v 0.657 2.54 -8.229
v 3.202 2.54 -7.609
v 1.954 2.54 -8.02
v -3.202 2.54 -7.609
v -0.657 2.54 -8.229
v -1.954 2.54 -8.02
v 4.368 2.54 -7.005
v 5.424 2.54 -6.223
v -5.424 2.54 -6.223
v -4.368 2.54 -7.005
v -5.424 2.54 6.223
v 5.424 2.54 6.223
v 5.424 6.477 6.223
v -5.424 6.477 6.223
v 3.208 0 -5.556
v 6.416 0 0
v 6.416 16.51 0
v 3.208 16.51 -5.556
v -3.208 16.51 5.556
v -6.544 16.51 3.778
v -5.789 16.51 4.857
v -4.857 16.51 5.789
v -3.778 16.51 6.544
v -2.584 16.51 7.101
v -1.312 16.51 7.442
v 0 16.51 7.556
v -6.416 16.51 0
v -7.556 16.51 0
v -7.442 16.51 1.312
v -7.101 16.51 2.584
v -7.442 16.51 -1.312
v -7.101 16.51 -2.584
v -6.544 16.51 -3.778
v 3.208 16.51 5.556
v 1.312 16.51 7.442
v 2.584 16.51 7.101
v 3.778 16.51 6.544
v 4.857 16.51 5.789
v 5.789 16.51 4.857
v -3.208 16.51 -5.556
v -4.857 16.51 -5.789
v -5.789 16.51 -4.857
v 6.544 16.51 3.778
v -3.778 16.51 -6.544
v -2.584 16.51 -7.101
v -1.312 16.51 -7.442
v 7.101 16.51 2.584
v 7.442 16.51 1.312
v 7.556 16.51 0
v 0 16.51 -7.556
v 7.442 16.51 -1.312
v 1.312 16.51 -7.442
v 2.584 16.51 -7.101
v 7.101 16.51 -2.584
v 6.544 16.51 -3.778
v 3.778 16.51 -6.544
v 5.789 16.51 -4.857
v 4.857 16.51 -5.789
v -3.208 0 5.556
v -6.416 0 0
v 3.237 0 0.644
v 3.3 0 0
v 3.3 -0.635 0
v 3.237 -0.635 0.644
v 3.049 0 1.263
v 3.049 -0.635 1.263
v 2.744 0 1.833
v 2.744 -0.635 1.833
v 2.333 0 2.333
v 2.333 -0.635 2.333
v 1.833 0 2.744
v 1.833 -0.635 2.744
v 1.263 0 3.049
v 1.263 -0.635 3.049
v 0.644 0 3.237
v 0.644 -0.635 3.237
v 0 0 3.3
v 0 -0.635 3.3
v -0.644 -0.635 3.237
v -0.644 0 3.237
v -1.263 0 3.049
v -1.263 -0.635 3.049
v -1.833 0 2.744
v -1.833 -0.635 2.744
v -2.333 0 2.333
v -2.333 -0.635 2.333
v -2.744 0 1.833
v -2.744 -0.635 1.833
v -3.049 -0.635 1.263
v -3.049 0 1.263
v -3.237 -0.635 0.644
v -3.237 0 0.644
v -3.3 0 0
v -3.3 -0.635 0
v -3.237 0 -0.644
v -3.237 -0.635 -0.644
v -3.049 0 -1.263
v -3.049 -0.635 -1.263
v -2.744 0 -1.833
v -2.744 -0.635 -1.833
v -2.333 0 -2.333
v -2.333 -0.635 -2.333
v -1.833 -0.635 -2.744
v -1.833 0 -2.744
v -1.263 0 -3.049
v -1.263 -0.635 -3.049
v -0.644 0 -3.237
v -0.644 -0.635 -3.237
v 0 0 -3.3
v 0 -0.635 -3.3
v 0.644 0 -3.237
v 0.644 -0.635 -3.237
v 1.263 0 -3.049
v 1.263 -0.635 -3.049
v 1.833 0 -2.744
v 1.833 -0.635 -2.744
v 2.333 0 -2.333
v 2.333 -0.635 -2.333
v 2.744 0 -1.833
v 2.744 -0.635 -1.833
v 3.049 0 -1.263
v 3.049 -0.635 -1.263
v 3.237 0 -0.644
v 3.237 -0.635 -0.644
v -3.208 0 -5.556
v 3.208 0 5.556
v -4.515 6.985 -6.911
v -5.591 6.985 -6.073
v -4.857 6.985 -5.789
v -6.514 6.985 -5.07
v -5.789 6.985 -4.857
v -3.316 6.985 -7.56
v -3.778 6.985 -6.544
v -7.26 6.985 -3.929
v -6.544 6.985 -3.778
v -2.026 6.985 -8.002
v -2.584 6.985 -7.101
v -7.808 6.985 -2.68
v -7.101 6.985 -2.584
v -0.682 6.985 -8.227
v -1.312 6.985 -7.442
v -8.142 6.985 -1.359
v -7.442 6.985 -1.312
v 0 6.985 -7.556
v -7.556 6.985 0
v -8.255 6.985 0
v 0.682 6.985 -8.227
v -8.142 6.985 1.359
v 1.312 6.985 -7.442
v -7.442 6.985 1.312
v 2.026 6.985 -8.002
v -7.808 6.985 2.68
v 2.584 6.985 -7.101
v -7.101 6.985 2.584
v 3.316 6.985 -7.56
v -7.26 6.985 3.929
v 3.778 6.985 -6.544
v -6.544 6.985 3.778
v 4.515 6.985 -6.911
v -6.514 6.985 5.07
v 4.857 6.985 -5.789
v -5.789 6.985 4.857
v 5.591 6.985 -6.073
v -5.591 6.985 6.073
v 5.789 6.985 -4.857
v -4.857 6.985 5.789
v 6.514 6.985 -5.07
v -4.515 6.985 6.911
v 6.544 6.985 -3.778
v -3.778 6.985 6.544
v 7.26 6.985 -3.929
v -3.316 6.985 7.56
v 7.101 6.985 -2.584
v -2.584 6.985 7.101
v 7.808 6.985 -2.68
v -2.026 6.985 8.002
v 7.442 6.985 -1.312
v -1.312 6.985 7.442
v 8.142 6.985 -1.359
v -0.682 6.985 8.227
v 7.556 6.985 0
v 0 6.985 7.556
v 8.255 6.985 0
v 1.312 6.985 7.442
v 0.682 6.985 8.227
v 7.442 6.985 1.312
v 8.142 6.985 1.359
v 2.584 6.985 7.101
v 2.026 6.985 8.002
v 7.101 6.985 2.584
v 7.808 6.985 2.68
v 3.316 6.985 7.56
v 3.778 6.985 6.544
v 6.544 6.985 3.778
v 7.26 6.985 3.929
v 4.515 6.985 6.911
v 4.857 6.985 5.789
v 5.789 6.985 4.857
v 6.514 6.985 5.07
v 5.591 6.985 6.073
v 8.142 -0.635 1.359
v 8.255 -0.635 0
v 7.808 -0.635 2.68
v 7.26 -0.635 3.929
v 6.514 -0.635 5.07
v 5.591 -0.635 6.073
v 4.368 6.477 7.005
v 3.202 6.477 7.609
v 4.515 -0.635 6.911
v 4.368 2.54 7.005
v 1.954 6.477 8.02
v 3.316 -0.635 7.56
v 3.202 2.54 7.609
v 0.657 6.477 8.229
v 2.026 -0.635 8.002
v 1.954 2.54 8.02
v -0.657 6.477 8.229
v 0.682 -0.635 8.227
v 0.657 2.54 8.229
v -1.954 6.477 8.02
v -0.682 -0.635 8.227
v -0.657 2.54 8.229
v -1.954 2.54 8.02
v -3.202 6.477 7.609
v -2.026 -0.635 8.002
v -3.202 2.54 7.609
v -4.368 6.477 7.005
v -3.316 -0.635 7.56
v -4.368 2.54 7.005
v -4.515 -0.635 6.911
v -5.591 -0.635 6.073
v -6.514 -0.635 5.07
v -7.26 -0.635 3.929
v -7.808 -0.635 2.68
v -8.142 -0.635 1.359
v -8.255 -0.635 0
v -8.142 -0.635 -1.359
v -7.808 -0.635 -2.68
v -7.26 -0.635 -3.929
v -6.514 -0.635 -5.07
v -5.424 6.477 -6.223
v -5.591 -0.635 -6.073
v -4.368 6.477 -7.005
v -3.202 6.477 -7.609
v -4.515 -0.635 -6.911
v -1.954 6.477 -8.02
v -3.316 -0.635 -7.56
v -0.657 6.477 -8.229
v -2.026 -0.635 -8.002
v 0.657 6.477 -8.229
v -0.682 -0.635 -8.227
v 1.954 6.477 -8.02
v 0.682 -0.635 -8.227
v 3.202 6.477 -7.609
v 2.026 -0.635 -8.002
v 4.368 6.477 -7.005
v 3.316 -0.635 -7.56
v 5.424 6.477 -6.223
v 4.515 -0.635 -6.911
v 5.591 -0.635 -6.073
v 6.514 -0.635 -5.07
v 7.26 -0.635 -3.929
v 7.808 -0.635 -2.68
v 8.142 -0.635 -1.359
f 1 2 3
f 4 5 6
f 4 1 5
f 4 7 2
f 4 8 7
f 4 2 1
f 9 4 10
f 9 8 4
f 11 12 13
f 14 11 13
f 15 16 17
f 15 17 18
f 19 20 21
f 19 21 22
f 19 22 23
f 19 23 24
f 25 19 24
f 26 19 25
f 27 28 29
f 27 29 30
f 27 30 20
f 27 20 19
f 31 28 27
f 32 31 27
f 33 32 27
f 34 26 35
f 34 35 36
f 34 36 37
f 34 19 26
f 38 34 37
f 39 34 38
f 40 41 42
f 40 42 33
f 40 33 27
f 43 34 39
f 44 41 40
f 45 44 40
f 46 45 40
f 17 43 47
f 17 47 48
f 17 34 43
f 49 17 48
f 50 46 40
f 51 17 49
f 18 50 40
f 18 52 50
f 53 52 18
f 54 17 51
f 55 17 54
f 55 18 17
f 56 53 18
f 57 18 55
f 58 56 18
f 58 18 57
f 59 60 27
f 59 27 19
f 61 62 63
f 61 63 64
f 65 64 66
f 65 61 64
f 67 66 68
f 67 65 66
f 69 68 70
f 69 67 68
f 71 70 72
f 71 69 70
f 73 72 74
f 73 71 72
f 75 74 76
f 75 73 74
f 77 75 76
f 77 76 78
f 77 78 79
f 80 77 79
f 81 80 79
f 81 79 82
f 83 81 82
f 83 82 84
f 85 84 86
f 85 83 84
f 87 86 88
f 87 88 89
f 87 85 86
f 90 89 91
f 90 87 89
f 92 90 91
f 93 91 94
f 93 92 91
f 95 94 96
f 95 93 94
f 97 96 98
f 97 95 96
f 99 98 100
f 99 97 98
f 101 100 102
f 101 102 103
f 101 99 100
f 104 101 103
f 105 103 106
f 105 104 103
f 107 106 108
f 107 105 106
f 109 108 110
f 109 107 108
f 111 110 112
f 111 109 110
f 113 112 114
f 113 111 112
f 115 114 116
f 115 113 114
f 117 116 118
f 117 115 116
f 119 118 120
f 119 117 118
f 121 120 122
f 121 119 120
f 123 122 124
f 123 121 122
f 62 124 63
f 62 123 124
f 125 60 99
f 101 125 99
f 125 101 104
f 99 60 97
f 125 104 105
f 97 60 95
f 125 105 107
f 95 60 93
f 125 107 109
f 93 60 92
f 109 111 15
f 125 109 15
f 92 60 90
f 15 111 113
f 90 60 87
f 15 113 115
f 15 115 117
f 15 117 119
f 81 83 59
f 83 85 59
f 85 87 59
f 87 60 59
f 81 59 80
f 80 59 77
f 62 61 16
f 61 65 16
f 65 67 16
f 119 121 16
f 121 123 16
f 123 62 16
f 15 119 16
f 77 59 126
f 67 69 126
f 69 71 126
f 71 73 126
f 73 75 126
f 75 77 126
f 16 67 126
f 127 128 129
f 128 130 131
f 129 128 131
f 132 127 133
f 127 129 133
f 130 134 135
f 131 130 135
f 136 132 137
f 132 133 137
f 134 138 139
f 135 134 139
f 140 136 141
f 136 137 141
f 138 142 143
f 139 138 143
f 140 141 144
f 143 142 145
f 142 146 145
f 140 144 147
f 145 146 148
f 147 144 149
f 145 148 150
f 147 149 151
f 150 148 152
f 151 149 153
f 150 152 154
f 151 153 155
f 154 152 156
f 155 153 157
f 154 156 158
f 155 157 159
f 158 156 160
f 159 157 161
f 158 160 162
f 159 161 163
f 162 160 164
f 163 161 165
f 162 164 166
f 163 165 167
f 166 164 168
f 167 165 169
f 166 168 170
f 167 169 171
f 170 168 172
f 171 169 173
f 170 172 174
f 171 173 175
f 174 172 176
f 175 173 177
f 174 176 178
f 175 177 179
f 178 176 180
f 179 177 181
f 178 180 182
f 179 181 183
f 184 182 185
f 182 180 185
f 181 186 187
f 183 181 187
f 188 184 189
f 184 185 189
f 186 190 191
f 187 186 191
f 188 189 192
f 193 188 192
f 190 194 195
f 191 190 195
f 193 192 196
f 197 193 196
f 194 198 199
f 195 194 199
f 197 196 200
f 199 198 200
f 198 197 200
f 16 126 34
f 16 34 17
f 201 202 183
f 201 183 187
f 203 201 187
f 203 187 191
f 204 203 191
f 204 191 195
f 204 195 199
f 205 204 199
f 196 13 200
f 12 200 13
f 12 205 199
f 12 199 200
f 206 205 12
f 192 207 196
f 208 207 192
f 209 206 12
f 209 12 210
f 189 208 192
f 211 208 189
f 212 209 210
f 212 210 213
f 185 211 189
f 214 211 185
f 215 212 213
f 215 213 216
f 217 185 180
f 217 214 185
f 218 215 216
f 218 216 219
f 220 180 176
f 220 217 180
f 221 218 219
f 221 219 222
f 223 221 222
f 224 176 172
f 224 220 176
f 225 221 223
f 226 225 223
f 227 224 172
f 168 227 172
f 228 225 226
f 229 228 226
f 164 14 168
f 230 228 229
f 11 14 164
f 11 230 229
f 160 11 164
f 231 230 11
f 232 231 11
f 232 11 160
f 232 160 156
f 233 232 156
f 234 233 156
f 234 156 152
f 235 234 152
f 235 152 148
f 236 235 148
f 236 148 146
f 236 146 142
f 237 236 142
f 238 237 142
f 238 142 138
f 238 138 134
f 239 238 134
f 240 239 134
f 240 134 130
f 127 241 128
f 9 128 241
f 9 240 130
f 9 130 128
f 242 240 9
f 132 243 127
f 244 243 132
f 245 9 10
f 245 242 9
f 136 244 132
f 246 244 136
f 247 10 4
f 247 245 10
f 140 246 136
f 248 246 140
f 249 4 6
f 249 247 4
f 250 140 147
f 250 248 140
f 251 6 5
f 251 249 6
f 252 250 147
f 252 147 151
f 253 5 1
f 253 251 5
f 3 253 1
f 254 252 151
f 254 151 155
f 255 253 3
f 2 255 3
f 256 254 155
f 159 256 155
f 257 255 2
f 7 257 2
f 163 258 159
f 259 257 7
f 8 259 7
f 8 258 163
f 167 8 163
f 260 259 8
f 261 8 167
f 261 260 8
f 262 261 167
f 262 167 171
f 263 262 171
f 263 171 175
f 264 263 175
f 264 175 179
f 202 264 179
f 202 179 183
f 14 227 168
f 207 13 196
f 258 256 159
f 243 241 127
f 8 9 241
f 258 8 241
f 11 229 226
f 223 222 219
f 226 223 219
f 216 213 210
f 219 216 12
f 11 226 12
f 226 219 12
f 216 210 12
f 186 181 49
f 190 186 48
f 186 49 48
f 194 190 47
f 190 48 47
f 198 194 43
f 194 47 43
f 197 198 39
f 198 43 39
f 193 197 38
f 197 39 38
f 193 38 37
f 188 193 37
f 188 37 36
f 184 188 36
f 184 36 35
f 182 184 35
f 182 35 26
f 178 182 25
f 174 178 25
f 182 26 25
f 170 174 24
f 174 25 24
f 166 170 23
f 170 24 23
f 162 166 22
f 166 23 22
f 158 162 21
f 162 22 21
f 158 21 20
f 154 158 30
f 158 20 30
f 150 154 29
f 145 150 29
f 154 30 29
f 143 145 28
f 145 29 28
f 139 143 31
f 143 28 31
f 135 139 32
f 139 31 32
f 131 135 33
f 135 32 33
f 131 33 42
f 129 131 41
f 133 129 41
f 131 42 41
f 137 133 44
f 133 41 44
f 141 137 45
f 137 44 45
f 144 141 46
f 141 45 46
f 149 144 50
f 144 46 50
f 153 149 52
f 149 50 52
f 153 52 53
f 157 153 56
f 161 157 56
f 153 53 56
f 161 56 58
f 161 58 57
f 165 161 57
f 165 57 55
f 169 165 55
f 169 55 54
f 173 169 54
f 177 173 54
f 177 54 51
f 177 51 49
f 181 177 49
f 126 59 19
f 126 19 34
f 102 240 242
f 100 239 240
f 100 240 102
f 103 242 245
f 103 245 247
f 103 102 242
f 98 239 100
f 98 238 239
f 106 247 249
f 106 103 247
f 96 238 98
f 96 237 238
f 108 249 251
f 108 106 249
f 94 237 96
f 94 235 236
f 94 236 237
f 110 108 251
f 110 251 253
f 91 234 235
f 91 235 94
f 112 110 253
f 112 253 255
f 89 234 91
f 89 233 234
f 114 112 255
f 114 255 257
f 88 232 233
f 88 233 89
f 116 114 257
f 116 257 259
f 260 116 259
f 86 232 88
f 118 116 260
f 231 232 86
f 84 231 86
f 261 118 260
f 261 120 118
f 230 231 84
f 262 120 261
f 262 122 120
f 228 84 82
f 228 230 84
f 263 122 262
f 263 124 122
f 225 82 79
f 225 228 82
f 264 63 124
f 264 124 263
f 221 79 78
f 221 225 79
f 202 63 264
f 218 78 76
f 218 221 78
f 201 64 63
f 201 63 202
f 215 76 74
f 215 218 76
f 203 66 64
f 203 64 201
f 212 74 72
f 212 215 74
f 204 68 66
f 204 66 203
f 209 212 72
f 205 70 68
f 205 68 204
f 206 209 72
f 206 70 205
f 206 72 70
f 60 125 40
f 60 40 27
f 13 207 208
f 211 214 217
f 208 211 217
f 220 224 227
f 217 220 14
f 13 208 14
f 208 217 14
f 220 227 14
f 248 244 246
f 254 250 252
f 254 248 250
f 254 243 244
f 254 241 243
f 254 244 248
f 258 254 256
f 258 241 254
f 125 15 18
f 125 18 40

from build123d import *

# Parameters (mm, degrees)
SKETCH1_R               = 7.5565
BOSS_EXTRUDE1_DEPTH     = 16.51
SKETCH2_R               = 7.5565
SKETCH2_R_2             = 3.3
BOSS_EXTRUDE2_DEPTH     = 0.635
SKETCH4_R               = 8.255
SKETCH4_R_2             = 7.5565
BOSS_EXTRUDE3_DEPTH     = 7.62
SKETCH3_W               = 2.572814656
SKETCH3_H               = 3.937
SKETCH3_W_2             = 2.256055482
CUT_EXTRUDE1_DEPTH      = 9.255
CUT_EXTRUDE1_DEPTH_BACK = 9.255


with BuildPart() as part:
    # Sketch1 → Boss-Extrude1 (new body)
    with BuildSketch(Plane(origin=(0, 0, 0), x_dir=(1, 0, 0), z_dir=(0, 1, 0))):
        Circle(SKETCH1_R)
        Polygon((-3.207902433, 5.55625), (-6.415804866, 0), (-3.207902433, -5.55625), (3.207902433, -5.55625), (6.415804866, 0), (3.207902433, 5.55625), align=None, mode=Mode.SUBTRACT)
    extrude(amount=BOSS_EXTRUDE1_DEPTH)

    # Sketch2 → Boss-Extrude2 (add)
    with BuildSketch(Plane.XZ):
        Circle(SKETCH2_R)
        Circle(SKETCH2_R_2, mode=Mode.SUBTRACT)
    extrude(amount=BOSS_EXTRUDE2_DEPTH)

    # Sketch4 → Boss-Extrude3 (add)
    with BuildSketch(Plane.XZ.offset(0.635)):
        Circle(SKETCH4_R)
        Circle(SKETCH4_R_2, mode=Mode.SUBTRACT)
    extrude(amount=-BOSS_EXTRUDE3_DEPTH)

    # Sketch3 → Cut-Extrude1 (cut, two sides)
    with BuildSketch(Plane(origin=(0, 0, 0), x_dir=(0, 0, -1), z_dir=(1, 0, 0))) as cut_extrude1_sk:
        with Locations((-7.509407328, 4.5085)):
            Rectangle(SKETCH3_W, SKETCH3_H)
        with Locations((7.351027741, 4.5085)):
            Rectangle(SKETCH3_W_2, SKETCH3_H)
    extrude(amount=CUT_EXTRUDE1_DEPTH, mode=Mode.SUBTRACT)
    extrude(cut_extrude1_sk.sketch, amount=-CUT_EXTRUDE1_DEPTH_BACK, mode=Mode.SUBTRACT)


solid = part.part
